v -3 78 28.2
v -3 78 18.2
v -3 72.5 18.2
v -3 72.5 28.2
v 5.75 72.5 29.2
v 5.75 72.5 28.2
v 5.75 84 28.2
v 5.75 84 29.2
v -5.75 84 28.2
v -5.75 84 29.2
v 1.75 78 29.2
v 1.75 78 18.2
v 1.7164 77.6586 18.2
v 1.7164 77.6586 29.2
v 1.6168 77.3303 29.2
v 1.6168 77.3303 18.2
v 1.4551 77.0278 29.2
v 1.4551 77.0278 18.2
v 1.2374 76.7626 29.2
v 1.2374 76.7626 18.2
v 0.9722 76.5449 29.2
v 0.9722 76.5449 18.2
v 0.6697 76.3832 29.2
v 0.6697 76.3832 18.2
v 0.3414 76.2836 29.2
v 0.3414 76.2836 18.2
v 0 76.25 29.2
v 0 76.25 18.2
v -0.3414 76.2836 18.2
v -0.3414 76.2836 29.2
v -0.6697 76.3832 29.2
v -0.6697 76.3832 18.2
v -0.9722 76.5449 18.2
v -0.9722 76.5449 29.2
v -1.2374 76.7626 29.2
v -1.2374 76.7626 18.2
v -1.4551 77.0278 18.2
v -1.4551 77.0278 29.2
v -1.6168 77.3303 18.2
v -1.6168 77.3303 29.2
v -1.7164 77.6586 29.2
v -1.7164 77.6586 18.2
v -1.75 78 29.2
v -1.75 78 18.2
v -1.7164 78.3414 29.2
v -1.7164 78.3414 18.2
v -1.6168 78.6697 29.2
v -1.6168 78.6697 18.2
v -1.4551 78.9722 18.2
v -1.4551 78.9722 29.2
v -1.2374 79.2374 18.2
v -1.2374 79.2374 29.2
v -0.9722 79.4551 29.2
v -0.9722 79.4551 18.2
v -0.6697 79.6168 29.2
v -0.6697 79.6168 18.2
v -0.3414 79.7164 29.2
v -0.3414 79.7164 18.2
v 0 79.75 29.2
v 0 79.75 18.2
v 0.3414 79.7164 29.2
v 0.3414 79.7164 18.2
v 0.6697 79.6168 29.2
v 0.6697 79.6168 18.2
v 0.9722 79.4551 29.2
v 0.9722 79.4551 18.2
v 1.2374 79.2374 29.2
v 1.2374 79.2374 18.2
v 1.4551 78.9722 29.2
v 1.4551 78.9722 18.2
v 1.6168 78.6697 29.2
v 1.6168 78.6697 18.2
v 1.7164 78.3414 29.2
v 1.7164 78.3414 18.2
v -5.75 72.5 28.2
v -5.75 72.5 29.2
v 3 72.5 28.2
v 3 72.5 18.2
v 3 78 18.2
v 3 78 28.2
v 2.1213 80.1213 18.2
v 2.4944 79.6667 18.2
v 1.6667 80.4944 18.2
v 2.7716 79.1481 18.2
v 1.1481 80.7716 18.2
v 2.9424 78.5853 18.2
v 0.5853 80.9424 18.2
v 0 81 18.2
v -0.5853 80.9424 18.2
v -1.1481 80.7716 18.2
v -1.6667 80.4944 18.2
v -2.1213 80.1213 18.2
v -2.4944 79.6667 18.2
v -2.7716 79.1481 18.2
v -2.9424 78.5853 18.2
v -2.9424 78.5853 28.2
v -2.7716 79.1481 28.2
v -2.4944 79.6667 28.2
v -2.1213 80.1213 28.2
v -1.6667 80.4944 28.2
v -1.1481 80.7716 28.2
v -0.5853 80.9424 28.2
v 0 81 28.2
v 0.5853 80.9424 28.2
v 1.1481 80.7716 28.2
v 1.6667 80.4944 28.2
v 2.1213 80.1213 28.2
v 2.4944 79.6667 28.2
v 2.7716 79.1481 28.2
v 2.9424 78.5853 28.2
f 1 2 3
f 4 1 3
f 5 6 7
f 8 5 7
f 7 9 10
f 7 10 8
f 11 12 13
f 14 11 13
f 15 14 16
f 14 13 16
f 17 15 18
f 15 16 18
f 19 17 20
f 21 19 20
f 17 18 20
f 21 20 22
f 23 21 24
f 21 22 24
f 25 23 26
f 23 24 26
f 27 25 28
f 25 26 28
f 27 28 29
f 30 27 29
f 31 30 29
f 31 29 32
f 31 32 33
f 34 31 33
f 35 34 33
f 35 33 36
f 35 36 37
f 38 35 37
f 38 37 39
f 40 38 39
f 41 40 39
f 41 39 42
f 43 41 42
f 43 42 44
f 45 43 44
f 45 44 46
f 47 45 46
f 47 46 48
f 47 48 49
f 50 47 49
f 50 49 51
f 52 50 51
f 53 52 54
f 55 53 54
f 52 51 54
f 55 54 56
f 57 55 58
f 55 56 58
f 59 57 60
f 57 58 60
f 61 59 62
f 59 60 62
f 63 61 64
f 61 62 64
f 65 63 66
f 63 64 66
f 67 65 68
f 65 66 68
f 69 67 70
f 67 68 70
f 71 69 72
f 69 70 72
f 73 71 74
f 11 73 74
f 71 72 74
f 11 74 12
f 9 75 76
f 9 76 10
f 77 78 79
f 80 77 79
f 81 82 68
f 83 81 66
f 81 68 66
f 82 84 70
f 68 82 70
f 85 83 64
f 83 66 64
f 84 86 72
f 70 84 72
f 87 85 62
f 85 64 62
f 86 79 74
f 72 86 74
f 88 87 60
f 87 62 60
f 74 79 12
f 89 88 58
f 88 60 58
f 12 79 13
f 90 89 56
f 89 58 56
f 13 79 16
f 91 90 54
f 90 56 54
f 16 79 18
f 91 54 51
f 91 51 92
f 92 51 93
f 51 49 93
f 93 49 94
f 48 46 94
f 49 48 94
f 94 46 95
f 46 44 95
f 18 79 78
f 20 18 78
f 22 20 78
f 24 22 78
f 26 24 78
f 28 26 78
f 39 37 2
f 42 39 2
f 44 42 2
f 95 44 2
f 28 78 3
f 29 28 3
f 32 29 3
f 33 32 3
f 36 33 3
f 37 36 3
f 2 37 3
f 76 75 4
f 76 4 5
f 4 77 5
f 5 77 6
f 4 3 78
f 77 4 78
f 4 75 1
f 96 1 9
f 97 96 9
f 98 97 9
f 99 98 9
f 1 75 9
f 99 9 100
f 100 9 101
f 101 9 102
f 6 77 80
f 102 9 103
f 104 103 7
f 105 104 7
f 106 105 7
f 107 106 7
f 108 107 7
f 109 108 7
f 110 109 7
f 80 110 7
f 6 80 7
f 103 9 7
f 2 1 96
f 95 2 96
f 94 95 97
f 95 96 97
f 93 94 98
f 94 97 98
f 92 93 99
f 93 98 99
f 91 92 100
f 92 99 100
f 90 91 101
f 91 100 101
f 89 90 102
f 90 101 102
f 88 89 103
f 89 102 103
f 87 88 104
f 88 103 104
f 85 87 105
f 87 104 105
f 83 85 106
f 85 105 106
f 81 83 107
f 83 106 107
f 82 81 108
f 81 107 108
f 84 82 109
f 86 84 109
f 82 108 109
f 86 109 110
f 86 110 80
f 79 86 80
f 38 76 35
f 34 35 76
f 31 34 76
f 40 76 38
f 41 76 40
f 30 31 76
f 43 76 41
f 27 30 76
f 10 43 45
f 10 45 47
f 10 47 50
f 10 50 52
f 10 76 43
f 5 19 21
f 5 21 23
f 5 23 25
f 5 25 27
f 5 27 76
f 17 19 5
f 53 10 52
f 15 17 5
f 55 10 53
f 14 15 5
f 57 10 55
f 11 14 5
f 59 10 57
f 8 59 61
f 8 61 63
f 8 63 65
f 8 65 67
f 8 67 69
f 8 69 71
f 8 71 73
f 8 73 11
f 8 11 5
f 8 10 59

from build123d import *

# Parameters (mm, degrees)
SKETCH022_W     = 11.5
SKETCH022_H     = 11.5
PAD010_DEPTH    = 1
PAD011_DEPTH    = 10
SKETCH024_R     = 1.75
POCKET010_DEPTH = 11.001


with BuildPart() as part:
    # Sketch022 → Pad010 (new body)
    with BuildSketch(Plane.XY):
        with Locations((0, 5.75)):
            Rectangle(SKETCH022_W, SKETCH022_H)
    extrude(amount=PAD010_DEPTH)

    # Sketch023 (on Face5 of Pad010) → Pad011 (join)
    with BuildSketch(Plane(origin=(0, 0, 0), x_dir=(1, 0, 0), z_dir=(0, 0, -1))):
        with BuildLine():
            Line((-3, -5.5), (-3, 0))
            Line((-3, 0), (3, 0))
            Line((3, 0), (3, -5.5))
            ThreePointArc((-3, -5.5), (0, -8.5), (3, -5.5))
        make_face()
    extrude(amount=PAD011_DEPTH)

    # Sketch024 (on Face11 of Pad011) → Pocket010 (cut, through all)
    with BuildSketch(Plane(origin=(0, 0, -10), x_dir=(1, 0, 0), z_dir=(0, 0, -1))):
        with Locations((0, -5.5)):
            Circle(SKETCH024_R)
    extrude(amount=-POCKET010_DEPTH, mode=Mode.SUBTRACT)


with BuildPart() as part_1:
    # Body009 placement: moved
    add(part.part.moved(Location((0, 72.5, 28.2))))


solid = part_1.part
